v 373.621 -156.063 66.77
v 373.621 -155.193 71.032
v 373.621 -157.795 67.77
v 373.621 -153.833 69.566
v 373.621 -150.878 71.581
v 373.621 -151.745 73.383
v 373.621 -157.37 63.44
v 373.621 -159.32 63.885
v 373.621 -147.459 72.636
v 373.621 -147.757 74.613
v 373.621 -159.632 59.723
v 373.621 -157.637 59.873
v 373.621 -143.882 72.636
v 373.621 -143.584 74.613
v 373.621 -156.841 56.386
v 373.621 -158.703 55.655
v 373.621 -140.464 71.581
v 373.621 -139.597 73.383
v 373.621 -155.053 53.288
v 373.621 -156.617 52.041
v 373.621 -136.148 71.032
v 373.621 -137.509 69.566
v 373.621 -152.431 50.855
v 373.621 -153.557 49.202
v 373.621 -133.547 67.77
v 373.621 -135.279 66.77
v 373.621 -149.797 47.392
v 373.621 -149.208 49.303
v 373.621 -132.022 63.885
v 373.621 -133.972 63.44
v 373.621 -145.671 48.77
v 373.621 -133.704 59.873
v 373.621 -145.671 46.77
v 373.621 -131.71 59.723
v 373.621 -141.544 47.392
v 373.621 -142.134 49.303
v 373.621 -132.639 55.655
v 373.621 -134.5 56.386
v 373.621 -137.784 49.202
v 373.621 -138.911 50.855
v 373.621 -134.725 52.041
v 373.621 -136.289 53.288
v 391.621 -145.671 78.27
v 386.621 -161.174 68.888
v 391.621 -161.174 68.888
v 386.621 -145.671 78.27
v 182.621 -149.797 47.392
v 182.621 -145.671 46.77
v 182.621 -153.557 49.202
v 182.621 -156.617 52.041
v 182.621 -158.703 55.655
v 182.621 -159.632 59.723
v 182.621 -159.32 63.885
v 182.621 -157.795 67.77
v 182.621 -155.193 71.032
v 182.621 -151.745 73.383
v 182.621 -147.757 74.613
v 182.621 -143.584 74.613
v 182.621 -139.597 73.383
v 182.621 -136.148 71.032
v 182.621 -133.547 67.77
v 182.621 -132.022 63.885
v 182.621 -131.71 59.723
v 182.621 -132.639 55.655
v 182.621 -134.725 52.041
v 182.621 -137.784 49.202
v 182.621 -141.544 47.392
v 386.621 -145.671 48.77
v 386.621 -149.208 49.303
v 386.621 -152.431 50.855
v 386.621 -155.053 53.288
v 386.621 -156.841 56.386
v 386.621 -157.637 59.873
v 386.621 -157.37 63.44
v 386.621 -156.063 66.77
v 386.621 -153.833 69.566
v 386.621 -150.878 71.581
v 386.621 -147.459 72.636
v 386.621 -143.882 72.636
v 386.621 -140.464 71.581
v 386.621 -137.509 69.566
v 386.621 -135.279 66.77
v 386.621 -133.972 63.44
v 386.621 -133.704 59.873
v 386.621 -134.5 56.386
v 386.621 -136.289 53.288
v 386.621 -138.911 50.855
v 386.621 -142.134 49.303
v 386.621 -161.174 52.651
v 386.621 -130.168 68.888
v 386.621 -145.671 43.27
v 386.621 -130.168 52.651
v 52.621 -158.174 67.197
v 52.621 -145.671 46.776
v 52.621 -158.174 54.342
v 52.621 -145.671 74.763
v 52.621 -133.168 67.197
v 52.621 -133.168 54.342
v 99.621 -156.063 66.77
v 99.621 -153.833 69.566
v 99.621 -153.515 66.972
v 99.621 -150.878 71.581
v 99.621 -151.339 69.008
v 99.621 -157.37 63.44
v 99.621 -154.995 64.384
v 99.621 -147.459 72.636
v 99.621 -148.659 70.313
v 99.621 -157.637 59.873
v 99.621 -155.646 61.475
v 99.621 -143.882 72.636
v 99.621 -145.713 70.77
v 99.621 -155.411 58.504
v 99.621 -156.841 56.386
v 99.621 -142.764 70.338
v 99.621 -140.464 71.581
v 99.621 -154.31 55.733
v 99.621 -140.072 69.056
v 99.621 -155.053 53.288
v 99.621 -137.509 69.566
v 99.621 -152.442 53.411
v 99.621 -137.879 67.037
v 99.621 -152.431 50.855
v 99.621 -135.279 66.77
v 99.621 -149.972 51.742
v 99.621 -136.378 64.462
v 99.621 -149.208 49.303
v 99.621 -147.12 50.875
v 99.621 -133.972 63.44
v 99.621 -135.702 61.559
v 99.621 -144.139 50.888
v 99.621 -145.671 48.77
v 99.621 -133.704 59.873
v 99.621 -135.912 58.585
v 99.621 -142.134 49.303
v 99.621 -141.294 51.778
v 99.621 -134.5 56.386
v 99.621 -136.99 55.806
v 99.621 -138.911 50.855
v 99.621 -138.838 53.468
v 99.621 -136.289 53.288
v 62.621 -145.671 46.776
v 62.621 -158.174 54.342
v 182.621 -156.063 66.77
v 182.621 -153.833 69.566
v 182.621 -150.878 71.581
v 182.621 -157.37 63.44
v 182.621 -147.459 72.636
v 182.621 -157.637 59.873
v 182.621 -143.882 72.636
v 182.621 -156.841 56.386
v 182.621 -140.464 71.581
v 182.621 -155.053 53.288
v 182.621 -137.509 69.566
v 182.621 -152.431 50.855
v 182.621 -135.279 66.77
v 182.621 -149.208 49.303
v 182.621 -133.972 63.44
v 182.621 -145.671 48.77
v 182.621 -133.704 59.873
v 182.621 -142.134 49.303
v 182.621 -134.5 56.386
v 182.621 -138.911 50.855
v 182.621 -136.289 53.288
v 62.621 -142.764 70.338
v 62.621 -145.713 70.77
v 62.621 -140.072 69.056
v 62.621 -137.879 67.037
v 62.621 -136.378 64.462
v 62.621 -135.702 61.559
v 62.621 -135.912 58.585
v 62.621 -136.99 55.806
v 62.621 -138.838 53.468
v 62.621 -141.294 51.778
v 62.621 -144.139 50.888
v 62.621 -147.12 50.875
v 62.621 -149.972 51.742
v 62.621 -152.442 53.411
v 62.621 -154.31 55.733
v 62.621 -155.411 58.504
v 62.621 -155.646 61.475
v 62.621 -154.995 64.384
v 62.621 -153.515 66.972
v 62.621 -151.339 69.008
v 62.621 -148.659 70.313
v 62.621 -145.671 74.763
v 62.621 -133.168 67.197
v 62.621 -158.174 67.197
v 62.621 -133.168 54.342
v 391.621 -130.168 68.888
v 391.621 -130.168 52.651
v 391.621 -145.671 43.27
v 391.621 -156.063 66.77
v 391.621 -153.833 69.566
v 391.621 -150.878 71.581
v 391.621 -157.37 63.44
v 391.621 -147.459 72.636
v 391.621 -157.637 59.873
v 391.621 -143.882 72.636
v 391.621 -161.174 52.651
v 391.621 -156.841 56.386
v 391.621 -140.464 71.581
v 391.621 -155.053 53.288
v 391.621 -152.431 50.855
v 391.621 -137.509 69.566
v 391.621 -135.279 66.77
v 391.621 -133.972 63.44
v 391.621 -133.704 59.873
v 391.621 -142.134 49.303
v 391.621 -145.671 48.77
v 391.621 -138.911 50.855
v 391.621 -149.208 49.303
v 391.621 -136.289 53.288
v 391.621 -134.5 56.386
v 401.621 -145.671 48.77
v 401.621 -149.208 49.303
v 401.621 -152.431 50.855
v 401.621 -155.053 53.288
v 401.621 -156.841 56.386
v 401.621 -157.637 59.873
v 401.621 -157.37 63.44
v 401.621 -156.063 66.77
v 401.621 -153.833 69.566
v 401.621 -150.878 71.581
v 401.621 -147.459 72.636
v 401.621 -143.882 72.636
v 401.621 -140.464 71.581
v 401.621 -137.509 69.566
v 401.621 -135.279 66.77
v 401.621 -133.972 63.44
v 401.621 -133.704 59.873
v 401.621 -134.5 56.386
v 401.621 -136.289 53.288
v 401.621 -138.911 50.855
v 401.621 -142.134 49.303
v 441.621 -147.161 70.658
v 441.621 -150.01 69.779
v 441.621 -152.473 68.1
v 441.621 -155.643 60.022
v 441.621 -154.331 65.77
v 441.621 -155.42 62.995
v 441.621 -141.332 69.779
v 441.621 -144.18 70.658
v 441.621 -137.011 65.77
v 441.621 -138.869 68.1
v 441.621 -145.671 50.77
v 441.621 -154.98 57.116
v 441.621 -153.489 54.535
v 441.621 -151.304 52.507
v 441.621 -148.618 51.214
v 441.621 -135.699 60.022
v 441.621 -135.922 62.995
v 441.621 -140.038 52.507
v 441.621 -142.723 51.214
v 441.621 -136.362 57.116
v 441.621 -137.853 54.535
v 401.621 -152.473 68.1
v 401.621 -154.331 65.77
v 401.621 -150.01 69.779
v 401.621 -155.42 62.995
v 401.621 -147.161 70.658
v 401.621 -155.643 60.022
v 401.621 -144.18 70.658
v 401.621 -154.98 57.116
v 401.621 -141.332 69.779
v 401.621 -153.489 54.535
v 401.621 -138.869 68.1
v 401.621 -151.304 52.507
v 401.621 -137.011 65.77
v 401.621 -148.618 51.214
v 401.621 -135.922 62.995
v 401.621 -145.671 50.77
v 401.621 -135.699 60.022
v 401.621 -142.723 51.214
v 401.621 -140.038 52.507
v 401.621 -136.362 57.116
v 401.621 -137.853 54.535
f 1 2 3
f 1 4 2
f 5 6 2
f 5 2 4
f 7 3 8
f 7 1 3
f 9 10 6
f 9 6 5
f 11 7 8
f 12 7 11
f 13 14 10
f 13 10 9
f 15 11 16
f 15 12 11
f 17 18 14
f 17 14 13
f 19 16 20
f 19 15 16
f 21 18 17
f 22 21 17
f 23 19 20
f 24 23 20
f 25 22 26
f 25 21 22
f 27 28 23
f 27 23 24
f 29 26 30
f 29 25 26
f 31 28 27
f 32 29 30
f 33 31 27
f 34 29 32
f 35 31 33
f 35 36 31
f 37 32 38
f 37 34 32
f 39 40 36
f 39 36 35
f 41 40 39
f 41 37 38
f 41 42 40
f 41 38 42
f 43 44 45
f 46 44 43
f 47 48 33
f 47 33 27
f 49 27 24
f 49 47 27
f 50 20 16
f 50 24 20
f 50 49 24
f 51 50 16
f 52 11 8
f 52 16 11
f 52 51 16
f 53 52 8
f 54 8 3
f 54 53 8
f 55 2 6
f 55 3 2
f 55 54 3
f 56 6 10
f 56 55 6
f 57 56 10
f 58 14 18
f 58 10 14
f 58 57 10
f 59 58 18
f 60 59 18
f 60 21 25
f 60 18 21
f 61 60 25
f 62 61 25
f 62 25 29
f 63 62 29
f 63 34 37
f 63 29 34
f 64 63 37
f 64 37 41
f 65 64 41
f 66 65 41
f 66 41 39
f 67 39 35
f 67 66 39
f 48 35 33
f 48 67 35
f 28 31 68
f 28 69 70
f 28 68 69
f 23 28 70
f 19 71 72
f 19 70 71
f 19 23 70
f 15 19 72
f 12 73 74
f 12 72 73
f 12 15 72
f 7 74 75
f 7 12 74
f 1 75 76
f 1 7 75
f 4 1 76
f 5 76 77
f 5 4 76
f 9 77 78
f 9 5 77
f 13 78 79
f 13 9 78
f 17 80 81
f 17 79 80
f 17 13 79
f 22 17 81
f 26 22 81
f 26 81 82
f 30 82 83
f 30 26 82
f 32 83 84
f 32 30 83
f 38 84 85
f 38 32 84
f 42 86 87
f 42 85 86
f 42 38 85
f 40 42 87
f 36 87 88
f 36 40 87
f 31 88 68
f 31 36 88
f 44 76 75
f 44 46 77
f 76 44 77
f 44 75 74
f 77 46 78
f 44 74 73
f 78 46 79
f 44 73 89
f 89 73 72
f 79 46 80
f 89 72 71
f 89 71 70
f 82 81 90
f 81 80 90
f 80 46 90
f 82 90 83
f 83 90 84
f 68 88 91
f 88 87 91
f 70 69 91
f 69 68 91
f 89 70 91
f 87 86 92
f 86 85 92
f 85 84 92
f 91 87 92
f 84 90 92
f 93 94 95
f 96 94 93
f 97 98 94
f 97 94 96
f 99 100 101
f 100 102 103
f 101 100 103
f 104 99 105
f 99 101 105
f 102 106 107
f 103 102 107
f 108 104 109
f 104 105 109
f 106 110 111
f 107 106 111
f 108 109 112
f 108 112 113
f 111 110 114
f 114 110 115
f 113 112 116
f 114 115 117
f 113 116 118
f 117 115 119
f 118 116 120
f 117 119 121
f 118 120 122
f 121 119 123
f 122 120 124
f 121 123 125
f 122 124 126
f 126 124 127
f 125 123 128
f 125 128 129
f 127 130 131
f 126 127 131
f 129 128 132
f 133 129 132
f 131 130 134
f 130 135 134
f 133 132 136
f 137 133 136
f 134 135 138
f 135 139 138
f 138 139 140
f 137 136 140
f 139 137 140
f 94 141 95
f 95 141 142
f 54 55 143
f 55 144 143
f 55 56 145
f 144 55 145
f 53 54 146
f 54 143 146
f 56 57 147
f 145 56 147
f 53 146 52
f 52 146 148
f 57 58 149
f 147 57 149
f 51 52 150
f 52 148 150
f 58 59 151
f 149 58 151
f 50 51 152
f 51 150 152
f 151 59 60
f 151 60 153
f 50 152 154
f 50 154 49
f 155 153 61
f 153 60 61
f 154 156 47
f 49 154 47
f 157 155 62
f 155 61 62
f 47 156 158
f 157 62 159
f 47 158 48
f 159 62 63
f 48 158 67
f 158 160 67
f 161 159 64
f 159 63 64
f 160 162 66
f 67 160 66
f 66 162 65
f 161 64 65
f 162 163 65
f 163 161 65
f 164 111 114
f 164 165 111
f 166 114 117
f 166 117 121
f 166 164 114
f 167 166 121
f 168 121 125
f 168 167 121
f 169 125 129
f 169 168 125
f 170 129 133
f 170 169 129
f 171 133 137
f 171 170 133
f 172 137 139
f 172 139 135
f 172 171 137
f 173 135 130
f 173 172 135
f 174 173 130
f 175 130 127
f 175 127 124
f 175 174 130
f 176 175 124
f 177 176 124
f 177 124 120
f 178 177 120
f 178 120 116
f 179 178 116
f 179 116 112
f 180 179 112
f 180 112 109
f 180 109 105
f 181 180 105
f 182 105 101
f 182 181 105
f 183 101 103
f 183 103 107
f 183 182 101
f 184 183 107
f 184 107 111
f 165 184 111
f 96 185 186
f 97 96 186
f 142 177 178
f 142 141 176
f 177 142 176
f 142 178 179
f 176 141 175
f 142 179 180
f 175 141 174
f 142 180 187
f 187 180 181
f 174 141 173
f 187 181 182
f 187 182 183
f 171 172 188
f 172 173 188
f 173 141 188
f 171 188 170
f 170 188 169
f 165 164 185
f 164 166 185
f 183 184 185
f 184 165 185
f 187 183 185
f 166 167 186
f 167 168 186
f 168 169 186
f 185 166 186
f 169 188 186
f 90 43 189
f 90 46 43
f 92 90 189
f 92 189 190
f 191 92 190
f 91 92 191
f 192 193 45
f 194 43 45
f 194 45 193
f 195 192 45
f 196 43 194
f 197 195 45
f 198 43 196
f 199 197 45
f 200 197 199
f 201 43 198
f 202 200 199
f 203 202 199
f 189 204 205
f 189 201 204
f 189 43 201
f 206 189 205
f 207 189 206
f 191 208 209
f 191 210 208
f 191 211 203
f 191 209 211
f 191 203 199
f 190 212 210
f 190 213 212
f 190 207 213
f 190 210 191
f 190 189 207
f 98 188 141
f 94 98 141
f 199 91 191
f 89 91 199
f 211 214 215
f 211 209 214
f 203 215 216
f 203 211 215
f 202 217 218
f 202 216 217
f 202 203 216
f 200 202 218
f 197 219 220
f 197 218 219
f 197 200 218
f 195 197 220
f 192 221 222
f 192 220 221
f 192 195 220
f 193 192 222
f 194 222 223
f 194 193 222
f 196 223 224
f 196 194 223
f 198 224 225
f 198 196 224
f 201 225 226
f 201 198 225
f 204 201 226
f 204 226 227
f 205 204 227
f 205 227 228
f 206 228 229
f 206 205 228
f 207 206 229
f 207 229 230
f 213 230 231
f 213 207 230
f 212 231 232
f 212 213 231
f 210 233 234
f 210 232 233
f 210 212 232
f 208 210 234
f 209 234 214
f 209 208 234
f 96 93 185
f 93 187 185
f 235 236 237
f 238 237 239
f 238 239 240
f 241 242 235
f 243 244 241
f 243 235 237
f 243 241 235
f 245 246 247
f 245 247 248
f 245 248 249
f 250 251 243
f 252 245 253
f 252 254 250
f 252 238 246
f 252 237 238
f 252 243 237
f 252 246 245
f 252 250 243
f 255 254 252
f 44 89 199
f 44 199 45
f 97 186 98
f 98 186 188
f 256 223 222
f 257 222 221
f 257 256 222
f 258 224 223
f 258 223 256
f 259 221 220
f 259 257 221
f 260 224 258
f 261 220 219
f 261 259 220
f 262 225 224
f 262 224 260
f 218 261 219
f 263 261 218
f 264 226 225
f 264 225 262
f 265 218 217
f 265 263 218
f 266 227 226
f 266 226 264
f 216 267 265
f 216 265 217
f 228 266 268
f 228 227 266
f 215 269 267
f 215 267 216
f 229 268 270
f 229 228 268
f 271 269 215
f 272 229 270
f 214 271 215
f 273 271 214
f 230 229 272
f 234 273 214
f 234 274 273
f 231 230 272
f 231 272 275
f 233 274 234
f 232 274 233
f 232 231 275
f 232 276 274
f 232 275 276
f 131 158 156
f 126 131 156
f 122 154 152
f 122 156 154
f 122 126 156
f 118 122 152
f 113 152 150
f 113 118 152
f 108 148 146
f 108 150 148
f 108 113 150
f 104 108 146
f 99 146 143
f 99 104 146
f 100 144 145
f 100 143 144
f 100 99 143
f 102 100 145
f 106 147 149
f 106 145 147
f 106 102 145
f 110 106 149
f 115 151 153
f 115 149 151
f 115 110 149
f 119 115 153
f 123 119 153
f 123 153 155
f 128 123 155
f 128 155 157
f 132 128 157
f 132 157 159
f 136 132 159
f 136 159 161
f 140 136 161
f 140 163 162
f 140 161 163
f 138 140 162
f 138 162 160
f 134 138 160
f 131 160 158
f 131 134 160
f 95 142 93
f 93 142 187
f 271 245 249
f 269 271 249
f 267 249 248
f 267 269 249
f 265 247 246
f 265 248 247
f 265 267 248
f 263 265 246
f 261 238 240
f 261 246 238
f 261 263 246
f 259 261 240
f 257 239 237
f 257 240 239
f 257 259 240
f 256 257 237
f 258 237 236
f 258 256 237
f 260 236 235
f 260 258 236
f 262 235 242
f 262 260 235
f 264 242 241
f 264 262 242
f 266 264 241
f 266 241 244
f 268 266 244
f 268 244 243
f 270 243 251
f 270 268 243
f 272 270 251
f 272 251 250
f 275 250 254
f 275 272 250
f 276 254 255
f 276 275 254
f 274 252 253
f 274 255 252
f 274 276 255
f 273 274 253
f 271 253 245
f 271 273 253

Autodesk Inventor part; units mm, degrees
ref_plane "YZ Plane" through (0, 0, 0) normal (1, 0, 0) x (0, 1, 0)
ref_plane "XZ Plane" through (0, 0, 0) normal (0, 1, 0) x (-1, 0, 0)
ref_plane "Arbeitsebene1" through (62.6214, -145.6709, 60.7697) normal (-1, 0, 0) x (0, -0.0042, 1)
sketch "Skizze1" plane through (62.6214, -145.6709, 60.7697) normal (-1, 0, 0) x (0, -0.0042, 1)
  circle A0 centre (0, 0) radius 10
  point P0 (-61.3791, 145.4152)
  dimension "d0" = 20
extrude "Extrusion1" add sketch "Skizze1" against normal blind 37
sketch "Skizze2" plane through (99.6214, -145.6709, 60.7697) normal (1, 0, 0) x (0, 0, -1)
  circle A0 centre (0, 0) radius 10 projected
  circle A1 centre (0, 0) radius 12
  point P0 (60.7697, 145.6709)
  dimension "d3" = 24
extrude "Extrusion2" add sketch "Skizze2" along normal blind 83 contours A0 | A1
sketch "Skizze3" plane through (182.6214, -145.6709, 60.7697) normal (1, 0, 0) x (0, 0, -1)
  circle A0 centre (0, 0) radius 12 projected
  circle A1 centre (0, 0) radius 14
  point P0 (60.7697, 145.6709)
  dimension "d6" = 28
extrude "Extrusion3" add sketch "Skizze3" along normal blind 191 contours A0 | A1
sketch "Skizze4" plane through (373.6214, -145.6709, 60.7697) normal (1, 0, 0) x (0, 0, -1)
  circle A0 centre (0, 0) radius 10 projected
  circle A1 centre (0, 0) radius 12
  point P0 (60.7697, 145.6709)
  dimension "d9" = 24
extrude "Extrusion4" add sketch "Skizze4" along normal blind 13 contours A0 | A1
sketch "Skizze5" plane through (386.6214, -145.6709, 60.7697) normal (1, 0, 0) x (0, 0, -1)
  circle A0 centre (0, 0) radius 12 projected
  circle A1 centre (0, 0) radius 17.5 construction
  line L0 (-8.1188, 15.5028) -> (8.1188, 15.5028)
  line L1 (8.1188, 15.5028) -> (17.5, 0)
  line L2 (17.5, 0) -> (8.1188, -15.5028)
  line L3 (8.1188, -15.5028) -> (-8.1188, -15.5028)
  line L4 (-8.1188, -15.5028) -> (-17.5, 0)
  line L5 (-17.5, 0) -> (-8.1188, 15.5028)
  point P0 (60.7697, 145.6709)
  dimension "d12" = 35
extrude "Extrusion5" add sketch "Skizze5" along normal blind 5 contours A0 | L0 L1 L2 L3 L4 L5
sketch "Skizze6" plane through (391.6214, -145.6709, 60.7697) normal (1, 0, 0) x (0, 0, -1)
  circle A0 centre (0, 0) radius 10 projected
  circle A1 centre (0, 0) radius 12
  point P0 (60.7697, 145.6709)
  dimension "d15" = 24
extrude "Extrusion6" add sketch "Skizze6" along normal blind 10 contours A0 | A1
sketch "Skizze7" plane through (401.6214, -145.6709, 60.7697) normal (1, 0, 0) x (0, 0, -1)
  circle A0 centre (0, 0) radius 10 projected
  circle A1 centre (0, 0) radius 10
  point P0 (60.7697, 145.6709)
  dimension "d18" = 20
extrude "Extrusion7" add sketch "Skizze7" along normal blind 40
sketch "Skizze8" plane through (62.6214, -145.6709, 60.7697) normal (-1, 0, 0) x (0, 0, 1)
  line L0 (8.1188, 15.5028) -> (17.5, 0) projected
  line L1 (17.5, 0) -> (8.1188, -15.5028) projected
  line L2 (-8.1188, 15.5028) -> (8.1188, 15.5028) projected
  line L3 (-17.5, 0) -> (-8.1188, 15.5028) projected
  line L4 (-8.1188, -15.5028) -> (-17.5, 0) projected
  line L5 (8.1188, -15.5028) -> (-8.1188, -15.5028) projected
  line L6 (13.9935, 0) -> (6.4276, 12.5028)
  line L7 (6.4276, 12.5028) -> (-6.4276, 12.5028)
  line L8 (-6.4276, 12.5028) -> (-13.9935, 0)
  line L9 (-13.9935, 0) -> (-6.4276, -12.5028)
  line L10 (-6.4276, -12.5028) -> (6.4276, -12.5028)
  line L11 (6.4276, -12.5028) -> (13.9935, 0)
  point P0 (-60.7697, 145.6709)
  dimension "d23" = 3
extrude "Extrusion8" add sketch "Skizze8" along normal blind 10 contours L11 L10 L9 L8 L7 L6
properties part number "Welle"
